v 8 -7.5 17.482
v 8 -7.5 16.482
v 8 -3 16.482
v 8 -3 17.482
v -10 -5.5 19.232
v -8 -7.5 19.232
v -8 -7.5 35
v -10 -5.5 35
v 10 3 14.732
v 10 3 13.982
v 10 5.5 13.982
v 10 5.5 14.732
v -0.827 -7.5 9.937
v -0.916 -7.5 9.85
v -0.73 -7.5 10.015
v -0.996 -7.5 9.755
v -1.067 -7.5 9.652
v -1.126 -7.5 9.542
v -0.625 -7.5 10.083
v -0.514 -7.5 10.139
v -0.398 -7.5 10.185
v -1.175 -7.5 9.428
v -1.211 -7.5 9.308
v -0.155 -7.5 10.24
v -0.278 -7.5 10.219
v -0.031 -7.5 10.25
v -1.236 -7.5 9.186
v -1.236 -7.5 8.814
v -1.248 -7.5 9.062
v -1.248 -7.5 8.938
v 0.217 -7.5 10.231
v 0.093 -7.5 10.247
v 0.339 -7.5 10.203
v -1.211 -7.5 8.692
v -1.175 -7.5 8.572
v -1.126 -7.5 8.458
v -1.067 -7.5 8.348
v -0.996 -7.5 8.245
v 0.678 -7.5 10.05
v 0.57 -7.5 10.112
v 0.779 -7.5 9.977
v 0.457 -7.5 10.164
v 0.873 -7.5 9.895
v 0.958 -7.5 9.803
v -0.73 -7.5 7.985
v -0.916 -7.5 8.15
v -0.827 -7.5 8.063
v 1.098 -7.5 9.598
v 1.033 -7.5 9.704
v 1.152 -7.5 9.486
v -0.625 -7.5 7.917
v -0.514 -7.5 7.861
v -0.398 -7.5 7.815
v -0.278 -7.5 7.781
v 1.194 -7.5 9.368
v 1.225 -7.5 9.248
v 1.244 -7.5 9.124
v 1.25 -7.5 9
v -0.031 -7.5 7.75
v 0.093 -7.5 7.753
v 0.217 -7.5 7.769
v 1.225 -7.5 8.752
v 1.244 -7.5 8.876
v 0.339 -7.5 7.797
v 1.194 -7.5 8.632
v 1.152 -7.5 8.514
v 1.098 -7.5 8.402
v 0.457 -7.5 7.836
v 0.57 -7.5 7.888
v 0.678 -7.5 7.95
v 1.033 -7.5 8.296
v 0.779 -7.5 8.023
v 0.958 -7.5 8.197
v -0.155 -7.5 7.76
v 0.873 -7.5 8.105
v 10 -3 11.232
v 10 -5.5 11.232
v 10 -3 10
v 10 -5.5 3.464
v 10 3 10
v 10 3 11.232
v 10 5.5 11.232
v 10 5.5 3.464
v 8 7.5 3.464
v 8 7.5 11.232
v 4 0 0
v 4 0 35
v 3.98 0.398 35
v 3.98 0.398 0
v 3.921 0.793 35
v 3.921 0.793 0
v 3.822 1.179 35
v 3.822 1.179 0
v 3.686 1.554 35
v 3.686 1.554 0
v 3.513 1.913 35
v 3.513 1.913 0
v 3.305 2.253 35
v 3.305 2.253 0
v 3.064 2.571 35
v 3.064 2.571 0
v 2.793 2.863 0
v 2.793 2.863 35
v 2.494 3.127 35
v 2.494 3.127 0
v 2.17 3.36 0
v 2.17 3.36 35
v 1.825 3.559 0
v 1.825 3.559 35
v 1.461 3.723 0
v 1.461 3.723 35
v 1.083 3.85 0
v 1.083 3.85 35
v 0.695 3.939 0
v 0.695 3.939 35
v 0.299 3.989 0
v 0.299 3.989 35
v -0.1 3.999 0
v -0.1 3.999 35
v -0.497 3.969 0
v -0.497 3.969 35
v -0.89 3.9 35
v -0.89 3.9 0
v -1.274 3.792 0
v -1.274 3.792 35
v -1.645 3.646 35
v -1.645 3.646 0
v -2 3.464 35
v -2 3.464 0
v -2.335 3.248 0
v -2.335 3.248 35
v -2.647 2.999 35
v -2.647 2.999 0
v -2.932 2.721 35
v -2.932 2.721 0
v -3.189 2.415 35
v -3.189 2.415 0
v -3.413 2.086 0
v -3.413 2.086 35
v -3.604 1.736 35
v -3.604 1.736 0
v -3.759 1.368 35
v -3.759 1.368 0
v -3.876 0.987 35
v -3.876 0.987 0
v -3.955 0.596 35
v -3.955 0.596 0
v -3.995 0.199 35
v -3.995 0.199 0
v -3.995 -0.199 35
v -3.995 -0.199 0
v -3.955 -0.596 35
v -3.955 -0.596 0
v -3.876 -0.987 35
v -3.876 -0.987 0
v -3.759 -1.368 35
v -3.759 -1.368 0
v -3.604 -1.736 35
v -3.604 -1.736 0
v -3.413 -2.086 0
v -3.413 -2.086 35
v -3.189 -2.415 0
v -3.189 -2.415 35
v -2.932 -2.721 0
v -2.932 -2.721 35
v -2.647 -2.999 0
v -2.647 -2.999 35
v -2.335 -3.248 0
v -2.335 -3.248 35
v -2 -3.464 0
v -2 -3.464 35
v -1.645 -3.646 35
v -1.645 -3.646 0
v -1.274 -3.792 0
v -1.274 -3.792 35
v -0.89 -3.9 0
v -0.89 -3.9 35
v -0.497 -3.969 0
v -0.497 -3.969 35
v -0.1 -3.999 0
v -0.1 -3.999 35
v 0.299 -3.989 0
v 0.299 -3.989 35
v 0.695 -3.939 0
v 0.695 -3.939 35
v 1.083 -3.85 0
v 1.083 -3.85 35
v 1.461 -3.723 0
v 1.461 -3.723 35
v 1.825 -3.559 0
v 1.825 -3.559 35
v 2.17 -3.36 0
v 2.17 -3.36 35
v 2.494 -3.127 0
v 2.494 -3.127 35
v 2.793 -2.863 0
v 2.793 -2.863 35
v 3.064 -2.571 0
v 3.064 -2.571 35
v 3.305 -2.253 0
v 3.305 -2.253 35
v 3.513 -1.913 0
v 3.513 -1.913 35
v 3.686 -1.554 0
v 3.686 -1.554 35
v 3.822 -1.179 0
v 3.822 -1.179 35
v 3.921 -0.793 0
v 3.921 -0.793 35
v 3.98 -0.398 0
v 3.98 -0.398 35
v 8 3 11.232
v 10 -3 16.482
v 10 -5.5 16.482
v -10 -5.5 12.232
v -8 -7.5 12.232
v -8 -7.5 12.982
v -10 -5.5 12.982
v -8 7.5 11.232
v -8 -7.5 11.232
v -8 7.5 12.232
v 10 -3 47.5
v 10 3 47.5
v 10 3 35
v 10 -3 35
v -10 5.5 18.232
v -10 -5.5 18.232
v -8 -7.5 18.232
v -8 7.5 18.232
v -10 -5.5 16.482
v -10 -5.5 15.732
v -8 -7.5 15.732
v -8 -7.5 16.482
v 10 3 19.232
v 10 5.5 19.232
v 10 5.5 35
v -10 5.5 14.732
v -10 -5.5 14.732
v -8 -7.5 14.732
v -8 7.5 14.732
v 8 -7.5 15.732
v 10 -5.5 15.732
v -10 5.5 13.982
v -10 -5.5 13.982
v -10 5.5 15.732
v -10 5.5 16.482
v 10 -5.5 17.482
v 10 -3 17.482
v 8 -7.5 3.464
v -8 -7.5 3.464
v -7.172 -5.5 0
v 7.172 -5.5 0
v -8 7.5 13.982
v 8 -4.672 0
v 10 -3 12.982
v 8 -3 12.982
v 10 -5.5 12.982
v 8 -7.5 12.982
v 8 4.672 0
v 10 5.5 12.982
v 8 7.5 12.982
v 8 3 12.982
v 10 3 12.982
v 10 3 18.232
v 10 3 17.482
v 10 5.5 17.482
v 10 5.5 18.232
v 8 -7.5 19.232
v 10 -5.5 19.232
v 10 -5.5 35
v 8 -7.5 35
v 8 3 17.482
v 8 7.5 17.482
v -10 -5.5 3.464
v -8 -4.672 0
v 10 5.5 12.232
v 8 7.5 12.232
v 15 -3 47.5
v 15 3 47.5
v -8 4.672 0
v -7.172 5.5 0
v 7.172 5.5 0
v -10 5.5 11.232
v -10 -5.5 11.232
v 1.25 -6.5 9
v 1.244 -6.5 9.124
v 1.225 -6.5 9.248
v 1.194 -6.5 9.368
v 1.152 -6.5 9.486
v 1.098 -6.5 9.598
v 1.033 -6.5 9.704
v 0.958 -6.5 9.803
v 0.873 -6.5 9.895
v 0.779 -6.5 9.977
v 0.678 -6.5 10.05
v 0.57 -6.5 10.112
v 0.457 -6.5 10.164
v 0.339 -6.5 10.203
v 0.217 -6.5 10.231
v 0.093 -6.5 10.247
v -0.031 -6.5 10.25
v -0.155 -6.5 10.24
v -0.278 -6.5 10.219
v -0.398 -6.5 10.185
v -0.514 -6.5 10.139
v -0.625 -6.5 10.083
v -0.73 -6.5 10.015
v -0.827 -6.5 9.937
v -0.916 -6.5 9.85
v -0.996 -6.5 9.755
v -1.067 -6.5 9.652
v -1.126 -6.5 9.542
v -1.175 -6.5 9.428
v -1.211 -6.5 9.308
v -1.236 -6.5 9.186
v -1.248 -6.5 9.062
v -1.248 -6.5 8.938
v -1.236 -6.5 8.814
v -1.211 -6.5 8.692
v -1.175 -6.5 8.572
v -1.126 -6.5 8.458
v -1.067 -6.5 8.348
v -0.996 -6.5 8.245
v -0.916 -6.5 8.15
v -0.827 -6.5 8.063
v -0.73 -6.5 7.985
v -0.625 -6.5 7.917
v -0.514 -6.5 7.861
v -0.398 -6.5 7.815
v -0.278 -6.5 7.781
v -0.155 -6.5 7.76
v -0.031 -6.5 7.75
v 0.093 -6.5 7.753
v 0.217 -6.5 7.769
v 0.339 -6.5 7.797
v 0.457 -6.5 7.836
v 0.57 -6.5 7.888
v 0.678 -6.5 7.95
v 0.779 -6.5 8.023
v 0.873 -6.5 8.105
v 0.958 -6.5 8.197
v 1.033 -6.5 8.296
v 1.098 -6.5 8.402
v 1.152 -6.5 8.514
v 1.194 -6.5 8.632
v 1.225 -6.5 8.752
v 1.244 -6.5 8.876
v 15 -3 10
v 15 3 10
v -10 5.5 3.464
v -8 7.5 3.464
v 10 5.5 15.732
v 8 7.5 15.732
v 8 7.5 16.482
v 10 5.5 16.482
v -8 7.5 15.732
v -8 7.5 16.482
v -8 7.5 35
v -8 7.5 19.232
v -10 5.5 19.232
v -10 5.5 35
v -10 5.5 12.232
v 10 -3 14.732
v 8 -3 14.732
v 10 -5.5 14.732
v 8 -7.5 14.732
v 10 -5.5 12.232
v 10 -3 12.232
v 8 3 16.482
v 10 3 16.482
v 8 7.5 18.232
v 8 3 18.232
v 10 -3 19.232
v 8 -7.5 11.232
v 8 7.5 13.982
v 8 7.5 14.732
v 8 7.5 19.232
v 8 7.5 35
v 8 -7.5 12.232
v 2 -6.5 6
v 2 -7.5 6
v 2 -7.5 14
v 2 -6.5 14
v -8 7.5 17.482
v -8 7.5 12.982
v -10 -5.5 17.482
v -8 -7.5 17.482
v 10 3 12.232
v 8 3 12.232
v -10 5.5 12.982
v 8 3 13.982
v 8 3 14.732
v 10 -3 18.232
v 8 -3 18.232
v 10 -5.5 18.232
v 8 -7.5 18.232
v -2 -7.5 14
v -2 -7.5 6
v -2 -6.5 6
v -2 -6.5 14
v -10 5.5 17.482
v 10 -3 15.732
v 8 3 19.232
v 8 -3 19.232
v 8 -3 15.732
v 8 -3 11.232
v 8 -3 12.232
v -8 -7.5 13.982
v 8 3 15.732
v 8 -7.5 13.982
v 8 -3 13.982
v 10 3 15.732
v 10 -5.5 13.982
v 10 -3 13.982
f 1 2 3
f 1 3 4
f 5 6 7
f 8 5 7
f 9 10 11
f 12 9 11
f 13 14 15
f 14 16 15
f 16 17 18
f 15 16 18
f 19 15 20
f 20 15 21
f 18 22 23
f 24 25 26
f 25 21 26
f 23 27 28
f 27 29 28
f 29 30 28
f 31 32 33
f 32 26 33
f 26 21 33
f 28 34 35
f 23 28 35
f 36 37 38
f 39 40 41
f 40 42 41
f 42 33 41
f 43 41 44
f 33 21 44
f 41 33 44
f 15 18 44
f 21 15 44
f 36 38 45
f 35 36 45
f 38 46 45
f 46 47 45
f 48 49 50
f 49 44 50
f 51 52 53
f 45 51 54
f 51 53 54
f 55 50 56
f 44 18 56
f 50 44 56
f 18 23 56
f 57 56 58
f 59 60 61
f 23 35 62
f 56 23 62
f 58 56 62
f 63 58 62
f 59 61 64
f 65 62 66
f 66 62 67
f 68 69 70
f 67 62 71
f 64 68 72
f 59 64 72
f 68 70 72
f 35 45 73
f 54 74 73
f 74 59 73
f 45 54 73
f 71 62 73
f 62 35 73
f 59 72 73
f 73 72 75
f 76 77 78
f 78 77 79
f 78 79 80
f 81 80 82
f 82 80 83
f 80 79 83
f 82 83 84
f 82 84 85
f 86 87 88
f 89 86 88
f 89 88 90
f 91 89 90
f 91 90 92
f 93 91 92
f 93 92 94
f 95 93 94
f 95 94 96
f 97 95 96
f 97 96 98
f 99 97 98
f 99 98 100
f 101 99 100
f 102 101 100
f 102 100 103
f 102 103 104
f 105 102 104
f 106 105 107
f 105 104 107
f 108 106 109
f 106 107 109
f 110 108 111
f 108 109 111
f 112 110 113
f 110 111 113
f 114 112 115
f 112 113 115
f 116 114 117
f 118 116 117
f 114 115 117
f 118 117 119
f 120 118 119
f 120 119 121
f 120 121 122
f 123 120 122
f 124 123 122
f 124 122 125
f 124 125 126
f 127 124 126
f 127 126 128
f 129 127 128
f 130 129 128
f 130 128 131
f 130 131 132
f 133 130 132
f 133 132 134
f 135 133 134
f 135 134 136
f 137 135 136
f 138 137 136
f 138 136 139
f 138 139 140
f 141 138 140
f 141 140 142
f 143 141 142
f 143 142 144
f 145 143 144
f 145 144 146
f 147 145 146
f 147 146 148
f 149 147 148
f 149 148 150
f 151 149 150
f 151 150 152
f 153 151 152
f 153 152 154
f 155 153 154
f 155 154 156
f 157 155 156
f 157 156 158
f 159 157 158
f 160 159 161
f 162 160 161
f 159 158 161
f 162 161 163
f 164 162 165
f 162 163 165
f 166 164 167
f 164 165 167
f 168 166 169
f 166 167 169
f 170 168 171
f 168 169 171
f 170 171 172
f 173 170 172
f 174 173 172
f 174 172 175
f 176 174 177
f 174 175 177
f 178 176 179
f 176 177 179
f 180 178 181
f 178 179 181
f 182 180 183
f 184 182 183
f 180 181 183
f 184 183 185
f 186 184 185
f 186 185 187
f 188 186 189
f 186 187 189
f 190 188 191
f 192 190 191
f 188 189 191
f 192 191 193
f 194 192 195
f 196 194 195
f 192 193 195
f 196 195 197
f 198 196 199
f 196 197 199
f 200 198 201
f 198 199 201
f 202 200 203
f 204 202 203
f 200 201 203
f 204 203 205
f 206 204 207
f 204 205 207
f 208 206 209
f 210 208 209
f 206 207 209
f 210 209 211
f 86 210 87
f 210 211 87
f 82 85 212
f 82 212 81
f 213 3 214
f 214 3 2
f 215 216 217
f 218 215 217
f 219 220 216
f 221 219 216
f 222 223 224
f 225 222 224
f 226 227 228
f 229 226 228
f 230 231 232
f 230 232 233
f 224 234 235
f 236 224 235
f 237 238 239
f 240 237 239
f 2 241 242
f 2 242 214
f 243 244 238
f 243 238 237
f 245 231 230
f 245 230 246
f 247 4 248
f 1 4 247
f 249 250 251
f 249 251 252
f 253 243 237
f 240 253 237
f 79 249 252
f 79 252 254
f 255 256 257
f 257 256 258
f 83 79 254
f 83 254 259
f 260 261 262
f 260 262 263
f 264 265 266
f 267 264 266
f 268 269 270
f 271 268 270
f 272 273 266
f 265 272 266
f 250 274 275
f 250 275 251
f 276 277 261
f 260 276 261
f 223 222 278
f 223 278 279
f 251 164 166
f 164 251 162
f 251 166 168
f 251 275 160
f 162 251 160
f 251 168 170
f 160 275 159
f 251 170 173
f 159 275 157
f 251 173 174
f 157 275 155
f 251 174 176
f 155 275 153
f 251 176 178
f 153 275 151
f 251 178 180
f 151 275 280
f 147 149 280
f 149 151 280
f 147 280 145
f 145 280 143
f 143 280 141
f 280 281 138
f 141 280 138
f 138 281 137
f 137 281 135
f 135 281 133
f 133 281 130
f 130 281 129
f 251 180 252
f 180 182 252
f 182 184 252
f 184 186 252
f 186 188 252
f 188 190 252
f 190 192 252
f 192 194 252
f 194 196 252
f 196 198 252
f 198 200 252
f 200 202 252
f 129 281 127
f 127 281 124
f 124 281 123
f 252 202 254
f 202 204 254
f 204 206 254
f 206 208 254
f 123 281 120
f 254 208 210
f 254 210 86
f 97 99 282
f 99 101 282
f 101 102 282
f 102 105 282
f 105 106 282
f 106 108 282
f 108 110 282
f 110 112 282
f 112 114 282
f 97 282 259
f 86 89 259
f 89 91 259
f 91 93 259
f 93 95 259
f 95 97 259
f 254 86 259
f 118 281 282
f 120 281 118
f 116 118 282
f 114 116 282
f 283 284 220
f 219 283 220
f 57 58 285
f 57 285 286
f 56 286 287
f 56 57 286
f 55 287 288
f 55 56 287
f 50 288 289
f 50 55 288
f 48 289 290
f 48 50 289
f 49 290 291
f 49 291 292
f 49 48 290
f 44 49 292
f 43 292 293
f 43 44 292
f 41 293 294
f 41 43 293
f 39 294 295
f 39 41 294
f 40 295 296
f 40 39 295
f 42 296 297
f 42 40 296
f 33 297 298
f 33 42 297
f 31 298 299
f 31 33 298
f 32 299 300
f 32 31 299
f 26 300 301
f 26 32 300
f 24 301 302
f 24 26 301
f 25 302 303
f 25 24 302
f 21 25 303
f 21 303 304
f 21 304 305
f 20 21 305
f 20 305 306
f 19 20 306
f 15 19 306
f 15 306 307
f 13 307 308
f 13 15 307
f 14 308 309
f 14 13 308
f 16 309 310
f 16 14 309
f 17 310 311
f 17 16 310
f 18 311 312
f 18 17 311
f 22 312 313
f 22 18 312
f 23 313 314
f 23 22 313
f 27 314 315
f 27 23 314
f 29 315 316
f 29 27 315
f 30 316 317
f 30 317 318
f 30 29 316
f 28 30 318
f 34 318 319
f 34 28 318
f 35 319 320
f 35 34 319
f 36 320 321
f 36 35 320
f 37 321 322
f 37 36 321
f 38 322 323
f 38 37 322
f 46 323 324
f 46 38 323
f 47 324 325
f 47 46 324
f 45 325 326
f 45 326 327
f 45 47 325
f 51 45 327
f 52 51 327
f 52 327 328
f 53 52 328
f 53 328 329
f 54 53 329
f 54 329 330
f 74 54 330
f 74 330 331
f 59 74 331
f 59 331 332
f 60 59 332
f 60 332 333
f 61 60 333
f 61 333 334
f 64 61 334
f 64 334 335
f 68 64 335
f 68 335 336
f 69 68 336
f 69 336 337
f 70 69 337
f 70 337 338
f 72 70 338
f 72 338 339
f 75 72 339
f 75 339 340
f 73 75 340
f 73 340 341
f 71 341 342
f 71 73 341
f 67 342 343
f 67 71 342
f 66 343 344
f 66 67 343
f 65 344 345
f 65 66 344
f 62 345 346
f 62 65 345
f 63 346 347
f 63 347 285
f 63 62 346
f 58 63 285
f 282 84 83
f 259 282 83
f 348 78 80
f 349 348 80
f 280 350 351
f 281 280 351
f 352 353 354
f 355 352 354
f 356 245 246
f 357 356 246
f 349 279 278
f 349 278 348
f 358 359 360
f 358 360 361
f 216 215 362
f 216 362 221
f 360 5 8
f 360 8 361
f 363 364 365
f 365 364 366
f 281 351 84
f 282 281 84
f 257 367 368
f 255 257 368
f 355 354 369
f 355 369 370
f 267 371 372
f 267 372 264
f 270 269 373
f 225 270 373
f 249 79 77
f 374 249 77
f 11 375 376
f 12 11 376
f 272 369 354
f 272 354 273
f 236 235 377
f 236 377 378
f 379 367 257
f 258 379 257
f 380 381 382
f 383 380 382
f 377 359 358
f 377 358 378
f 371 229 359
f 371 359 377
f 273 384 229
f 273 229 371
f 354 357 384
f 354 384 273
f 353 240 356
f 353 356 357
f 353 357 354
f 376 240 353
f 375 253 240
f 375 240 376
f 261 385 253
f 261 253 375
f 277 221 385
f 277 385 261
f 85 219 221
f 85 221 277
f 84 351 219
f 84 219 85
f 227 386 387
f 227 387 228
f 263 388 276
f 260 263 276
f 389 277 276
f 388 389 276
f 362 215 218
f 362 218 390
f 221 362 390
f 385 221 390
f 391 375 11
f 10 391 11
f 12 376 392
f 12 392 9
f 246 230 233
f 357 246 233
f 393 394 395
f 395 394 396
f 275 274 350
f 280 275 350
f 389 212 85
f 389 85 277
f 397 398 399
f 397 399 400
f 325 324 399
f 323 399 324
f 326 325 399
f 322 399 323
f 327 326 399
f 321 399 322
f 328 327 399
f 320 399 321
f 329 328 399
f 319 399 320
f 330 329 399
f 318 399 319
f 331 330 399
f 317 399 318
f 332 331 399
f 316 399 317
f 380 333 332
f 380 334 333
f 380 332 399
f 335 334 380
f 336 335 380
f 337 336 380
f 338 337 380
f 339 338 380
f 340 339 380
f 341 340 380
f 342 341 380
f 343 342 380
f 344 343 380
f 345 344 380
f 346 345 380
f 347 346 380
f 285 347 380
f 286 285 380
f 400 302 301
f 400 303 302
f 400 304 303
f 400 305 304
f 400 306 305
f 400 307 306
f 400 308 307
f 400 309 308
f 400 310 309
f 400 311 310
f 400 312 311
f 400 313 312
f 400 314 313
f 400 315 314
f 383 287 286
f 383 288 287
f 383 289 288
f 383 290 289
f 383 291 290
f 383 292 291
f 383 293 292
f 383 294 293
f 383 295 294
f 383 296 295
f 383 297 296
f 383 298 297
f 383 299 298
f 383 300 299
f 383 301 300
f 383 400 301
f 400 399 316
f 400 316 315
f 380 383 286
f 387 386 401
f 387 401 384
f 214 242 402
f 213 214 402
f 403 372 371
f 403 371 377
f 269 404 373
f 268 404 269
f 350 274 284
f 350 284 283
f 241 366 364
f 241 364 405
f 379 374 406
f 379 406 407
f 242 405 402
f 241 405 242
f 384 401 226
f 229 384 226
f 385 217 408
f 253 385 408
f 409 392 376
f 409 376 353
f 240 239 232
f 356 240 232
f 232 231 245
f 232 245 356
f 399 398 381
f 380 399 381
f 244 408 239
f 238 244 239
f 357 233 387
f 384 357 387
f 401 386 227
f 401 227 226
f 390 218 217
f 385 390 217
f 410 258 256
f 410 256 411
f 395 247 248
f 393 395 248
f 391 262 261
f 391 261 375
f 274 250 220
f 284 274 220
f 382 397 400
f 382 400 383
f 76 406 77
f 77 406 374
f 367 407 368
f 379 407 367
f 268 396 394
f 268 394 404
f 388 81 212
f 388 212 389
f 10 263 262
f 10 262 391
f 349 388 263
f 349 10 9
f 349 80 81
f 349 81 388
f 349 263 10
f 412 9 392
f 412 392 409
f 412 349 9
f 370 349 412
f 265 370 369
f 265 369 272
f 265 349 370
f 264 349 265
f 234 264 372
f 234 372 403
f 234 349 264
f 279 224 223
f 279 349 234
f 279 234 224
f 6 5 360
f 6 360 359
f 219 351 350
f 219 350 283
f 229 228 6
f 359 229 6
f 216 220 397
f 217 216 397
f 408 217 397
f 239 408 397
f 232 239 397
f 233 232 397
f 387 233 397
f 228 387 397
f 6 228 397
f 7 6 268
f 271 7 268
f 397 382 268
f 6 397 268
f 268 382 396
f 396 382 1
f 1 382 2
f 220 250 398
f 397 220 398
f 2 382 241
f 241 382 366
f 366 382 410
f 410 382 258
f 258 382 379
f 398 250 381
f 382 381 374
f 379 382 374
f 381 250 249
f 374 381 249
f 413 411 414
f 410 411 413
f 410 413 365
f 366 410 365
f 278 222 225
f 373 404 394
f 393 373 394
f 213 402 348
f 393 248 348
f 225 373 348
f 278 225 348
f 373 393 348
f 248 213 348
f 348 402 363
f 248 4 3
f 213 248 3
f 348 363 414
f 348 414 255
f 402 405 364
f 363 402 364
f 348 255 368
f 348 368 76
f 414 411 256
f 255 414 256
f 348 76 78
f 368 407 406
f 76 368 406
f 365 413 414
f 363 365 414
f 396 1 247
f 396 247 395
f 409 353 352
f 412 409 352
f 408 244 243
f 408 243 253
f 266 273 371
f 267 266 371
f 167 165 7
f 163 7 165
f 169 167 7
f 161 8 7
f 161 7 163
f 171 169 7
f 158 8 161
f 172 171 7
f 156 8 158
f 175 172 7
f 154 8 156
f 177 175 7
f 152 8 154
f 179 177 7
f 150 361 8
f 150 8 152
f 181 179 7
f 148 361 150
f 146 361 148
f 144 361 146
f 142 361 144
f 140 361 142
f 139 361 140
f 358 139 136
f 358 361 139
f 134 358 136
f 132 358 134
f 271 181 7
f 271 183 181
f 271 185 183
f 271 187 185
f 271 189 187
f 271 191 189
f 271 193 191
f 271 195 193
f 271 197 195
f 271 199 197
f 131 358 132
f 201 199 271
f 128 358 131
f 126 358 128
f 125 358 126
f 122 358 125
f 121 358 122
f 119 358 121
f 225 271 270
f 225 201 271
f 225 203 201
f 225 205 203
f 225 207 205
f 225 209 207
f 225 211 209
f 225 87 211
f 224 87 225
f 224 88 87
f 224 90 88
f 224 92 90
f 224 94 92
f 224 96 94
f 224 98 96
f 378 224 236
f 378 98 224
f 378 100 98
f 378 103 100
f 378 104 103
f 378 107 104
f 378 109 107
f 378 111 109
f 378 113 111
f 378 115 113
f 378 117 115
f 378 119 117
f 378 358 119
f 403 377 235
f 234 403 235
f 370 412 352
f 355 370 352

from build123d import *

# Parameters (mm, degrees)
SKETCH1_W           = 20
SKETCH1_H           = 15
BOSS_EXTRUDE1_DEPTH = 35
SKETCH2_R           = 4
CUT_EXTRUDE1_DEPTH  = 36
CHAMFER1_SIZE       = 2
CHAMFER2_SIZE       = 2
CHAMFER2_SIZE2      = 3.464101615
SKETCH4_W           = 2
SKETCH4_H           = 1
CUT_EXTRUDE2_DEPTH  = 16
SKETCH5_W           = 4
SKETCH5_H           = 8
SKETCH5_R           = 1.25
CUT_EXTRUDE3_DEPTH  = 1
SKETCH3_W           = 37.5
SKETCH3_H           = 6
BOSS_EXTRUDE2_DEPTH = 5
SKETCH6_W           = 8
SKETCH6_H           = 6
BOSS_EXTRUDE3_DEPTH = 2


with BuildPart() as part:
    # Sketch1 → Boss-Extrude1 (new body)
    with BuildSketch(Plane.XY):
        Rectangle(SKETCH1_W, SKETCH1_H)
    extrude(amount=BOSS_EXTRUDE1_DEPTH)

    # Sketch2 → Cut-Extrude1 (cut, through all)
    with BuildSketch(Plane.XY.offset(35)):
        Circle(SKETCH2_R)
    extrude(amount=-CUT_EXTRUDE1_DEPTH, mode=Mode.SUBTRACT)

    # Chamfer1
    chamfer1_edges = [part.edges().sort_by_distance(p)[0] for p in [
        (10, 7.5, 17.5),
        (10, -7.5, 17.5),
        (-10, -7.5, 17.5),
        (-10, 7.5, 17.5),
    ]]
    chamfer(chamfer1_edges, length=CHAMFER1_SIZE)

    # Chamfer2
    chamfer2_edges = [part.edges().sort_by_distance(p)[0] for p in [
        (-10, 0, 0),
        (0, 7.5, 0),
        (10, 0, 0),
        (0, -7.5, 0),
        (9, 6.5, 0),
        (9, -6.5, 0),
        (-9, -6.5, 0),
        (-9, 6.5, 0),
    ]]
    chamfer2_side = [part.faces().sort_by_distance(p)[0] for p in [
        (-9.75, 0, 0),
    ]]
    chamfer(chamfer2_edges, length=CHAMFER2_SIZE, length2=CHAMFER2_SIZE2, reference=chamfer2_side[0])

    # Sketch4 → Cut-Extrude2 (cut, through all)
    with BuildSketch(Plane.XZ.offset(7.5)):
        with Locations((-9, 11.732050808)):
            Rectangle(SKETCH4_W, SKETCH4_H)
        with Locations((-9, 13.482050808)):
            Rectangle(SKETCH4_W, SKETCH4_H)
        with Locations((-9, 15.232050808)):
            Rectangle(SKETCH4_W, SKETCH4_H)
        with Locations((-9, 16.982050808)):
            Rectangle(SKETCH4_W, SKETCH4_H)
        with Locations((-9, 18.732050808)):
            Rectangle(SKETCH4_W, SKETCH4_H)
        with Locations((9, 18.732050808)):
            Rectangle(SKETCH4_W, SKETCH4_H)
        with Locations((9, 16.982050808)):
            Rectangle(SKETCH4_W, SKETCH4_H)
        with Locations((9, 15.232050808)):
            Rectangle(SKETCH4_W, SKETCH4_H)
        with Locations((9, 13.482050808)):
            Rectangle(SKETCH4_W, SKETCH4_H)
        with Locations((9, 11.732050808)):
            Rectangle(SKETCH4_W, SKETCH4_H)
    extrude(amount=-CUT_EXTRUDE2_DEPTH, mode=Mode.SUBTRACT)

    # Sketch5 → Cut-Extrude3 (cut)
    with BuildSketch(Plane.XZ.offset(7.5)):
        with Locations((0, 10)):
            Rectangle(SKETCH5_W, SKETCH5_H)
        with Locations((0, 9)):
            Circle(SKETCH5_R, mode=Mode.SUBTRACT)
    extrude(amount=-CUT_EXTRUDE3_DEPTH, mode=Mode.SUBTRACT)

    # Sketch3 → Boss-Extrude2 (add)
    with BuildSketch(Plane(origin=(10, 0, 0), x_dir=(0, 0, -1), z_dir=(1, 0, 0))):
        with Locations((-28.75, 0)):
            Rectangle(SKETCH3_W, SKETCH3_H)
    extrude(amount=BOSS_EXTRUDE2_DEPTH)

    # Sketch6 → Boss-Extrude3 (add)
    with BuildSketch(Plane.ZY.offset(-10)):
        with Locations((15.232050808, 0)):
            Rectangle(SKETCH6_W, SKETCH6_H)
    extrude(amount=BOSS_EXTRUDE3_DEPTH)


solid = part.part
